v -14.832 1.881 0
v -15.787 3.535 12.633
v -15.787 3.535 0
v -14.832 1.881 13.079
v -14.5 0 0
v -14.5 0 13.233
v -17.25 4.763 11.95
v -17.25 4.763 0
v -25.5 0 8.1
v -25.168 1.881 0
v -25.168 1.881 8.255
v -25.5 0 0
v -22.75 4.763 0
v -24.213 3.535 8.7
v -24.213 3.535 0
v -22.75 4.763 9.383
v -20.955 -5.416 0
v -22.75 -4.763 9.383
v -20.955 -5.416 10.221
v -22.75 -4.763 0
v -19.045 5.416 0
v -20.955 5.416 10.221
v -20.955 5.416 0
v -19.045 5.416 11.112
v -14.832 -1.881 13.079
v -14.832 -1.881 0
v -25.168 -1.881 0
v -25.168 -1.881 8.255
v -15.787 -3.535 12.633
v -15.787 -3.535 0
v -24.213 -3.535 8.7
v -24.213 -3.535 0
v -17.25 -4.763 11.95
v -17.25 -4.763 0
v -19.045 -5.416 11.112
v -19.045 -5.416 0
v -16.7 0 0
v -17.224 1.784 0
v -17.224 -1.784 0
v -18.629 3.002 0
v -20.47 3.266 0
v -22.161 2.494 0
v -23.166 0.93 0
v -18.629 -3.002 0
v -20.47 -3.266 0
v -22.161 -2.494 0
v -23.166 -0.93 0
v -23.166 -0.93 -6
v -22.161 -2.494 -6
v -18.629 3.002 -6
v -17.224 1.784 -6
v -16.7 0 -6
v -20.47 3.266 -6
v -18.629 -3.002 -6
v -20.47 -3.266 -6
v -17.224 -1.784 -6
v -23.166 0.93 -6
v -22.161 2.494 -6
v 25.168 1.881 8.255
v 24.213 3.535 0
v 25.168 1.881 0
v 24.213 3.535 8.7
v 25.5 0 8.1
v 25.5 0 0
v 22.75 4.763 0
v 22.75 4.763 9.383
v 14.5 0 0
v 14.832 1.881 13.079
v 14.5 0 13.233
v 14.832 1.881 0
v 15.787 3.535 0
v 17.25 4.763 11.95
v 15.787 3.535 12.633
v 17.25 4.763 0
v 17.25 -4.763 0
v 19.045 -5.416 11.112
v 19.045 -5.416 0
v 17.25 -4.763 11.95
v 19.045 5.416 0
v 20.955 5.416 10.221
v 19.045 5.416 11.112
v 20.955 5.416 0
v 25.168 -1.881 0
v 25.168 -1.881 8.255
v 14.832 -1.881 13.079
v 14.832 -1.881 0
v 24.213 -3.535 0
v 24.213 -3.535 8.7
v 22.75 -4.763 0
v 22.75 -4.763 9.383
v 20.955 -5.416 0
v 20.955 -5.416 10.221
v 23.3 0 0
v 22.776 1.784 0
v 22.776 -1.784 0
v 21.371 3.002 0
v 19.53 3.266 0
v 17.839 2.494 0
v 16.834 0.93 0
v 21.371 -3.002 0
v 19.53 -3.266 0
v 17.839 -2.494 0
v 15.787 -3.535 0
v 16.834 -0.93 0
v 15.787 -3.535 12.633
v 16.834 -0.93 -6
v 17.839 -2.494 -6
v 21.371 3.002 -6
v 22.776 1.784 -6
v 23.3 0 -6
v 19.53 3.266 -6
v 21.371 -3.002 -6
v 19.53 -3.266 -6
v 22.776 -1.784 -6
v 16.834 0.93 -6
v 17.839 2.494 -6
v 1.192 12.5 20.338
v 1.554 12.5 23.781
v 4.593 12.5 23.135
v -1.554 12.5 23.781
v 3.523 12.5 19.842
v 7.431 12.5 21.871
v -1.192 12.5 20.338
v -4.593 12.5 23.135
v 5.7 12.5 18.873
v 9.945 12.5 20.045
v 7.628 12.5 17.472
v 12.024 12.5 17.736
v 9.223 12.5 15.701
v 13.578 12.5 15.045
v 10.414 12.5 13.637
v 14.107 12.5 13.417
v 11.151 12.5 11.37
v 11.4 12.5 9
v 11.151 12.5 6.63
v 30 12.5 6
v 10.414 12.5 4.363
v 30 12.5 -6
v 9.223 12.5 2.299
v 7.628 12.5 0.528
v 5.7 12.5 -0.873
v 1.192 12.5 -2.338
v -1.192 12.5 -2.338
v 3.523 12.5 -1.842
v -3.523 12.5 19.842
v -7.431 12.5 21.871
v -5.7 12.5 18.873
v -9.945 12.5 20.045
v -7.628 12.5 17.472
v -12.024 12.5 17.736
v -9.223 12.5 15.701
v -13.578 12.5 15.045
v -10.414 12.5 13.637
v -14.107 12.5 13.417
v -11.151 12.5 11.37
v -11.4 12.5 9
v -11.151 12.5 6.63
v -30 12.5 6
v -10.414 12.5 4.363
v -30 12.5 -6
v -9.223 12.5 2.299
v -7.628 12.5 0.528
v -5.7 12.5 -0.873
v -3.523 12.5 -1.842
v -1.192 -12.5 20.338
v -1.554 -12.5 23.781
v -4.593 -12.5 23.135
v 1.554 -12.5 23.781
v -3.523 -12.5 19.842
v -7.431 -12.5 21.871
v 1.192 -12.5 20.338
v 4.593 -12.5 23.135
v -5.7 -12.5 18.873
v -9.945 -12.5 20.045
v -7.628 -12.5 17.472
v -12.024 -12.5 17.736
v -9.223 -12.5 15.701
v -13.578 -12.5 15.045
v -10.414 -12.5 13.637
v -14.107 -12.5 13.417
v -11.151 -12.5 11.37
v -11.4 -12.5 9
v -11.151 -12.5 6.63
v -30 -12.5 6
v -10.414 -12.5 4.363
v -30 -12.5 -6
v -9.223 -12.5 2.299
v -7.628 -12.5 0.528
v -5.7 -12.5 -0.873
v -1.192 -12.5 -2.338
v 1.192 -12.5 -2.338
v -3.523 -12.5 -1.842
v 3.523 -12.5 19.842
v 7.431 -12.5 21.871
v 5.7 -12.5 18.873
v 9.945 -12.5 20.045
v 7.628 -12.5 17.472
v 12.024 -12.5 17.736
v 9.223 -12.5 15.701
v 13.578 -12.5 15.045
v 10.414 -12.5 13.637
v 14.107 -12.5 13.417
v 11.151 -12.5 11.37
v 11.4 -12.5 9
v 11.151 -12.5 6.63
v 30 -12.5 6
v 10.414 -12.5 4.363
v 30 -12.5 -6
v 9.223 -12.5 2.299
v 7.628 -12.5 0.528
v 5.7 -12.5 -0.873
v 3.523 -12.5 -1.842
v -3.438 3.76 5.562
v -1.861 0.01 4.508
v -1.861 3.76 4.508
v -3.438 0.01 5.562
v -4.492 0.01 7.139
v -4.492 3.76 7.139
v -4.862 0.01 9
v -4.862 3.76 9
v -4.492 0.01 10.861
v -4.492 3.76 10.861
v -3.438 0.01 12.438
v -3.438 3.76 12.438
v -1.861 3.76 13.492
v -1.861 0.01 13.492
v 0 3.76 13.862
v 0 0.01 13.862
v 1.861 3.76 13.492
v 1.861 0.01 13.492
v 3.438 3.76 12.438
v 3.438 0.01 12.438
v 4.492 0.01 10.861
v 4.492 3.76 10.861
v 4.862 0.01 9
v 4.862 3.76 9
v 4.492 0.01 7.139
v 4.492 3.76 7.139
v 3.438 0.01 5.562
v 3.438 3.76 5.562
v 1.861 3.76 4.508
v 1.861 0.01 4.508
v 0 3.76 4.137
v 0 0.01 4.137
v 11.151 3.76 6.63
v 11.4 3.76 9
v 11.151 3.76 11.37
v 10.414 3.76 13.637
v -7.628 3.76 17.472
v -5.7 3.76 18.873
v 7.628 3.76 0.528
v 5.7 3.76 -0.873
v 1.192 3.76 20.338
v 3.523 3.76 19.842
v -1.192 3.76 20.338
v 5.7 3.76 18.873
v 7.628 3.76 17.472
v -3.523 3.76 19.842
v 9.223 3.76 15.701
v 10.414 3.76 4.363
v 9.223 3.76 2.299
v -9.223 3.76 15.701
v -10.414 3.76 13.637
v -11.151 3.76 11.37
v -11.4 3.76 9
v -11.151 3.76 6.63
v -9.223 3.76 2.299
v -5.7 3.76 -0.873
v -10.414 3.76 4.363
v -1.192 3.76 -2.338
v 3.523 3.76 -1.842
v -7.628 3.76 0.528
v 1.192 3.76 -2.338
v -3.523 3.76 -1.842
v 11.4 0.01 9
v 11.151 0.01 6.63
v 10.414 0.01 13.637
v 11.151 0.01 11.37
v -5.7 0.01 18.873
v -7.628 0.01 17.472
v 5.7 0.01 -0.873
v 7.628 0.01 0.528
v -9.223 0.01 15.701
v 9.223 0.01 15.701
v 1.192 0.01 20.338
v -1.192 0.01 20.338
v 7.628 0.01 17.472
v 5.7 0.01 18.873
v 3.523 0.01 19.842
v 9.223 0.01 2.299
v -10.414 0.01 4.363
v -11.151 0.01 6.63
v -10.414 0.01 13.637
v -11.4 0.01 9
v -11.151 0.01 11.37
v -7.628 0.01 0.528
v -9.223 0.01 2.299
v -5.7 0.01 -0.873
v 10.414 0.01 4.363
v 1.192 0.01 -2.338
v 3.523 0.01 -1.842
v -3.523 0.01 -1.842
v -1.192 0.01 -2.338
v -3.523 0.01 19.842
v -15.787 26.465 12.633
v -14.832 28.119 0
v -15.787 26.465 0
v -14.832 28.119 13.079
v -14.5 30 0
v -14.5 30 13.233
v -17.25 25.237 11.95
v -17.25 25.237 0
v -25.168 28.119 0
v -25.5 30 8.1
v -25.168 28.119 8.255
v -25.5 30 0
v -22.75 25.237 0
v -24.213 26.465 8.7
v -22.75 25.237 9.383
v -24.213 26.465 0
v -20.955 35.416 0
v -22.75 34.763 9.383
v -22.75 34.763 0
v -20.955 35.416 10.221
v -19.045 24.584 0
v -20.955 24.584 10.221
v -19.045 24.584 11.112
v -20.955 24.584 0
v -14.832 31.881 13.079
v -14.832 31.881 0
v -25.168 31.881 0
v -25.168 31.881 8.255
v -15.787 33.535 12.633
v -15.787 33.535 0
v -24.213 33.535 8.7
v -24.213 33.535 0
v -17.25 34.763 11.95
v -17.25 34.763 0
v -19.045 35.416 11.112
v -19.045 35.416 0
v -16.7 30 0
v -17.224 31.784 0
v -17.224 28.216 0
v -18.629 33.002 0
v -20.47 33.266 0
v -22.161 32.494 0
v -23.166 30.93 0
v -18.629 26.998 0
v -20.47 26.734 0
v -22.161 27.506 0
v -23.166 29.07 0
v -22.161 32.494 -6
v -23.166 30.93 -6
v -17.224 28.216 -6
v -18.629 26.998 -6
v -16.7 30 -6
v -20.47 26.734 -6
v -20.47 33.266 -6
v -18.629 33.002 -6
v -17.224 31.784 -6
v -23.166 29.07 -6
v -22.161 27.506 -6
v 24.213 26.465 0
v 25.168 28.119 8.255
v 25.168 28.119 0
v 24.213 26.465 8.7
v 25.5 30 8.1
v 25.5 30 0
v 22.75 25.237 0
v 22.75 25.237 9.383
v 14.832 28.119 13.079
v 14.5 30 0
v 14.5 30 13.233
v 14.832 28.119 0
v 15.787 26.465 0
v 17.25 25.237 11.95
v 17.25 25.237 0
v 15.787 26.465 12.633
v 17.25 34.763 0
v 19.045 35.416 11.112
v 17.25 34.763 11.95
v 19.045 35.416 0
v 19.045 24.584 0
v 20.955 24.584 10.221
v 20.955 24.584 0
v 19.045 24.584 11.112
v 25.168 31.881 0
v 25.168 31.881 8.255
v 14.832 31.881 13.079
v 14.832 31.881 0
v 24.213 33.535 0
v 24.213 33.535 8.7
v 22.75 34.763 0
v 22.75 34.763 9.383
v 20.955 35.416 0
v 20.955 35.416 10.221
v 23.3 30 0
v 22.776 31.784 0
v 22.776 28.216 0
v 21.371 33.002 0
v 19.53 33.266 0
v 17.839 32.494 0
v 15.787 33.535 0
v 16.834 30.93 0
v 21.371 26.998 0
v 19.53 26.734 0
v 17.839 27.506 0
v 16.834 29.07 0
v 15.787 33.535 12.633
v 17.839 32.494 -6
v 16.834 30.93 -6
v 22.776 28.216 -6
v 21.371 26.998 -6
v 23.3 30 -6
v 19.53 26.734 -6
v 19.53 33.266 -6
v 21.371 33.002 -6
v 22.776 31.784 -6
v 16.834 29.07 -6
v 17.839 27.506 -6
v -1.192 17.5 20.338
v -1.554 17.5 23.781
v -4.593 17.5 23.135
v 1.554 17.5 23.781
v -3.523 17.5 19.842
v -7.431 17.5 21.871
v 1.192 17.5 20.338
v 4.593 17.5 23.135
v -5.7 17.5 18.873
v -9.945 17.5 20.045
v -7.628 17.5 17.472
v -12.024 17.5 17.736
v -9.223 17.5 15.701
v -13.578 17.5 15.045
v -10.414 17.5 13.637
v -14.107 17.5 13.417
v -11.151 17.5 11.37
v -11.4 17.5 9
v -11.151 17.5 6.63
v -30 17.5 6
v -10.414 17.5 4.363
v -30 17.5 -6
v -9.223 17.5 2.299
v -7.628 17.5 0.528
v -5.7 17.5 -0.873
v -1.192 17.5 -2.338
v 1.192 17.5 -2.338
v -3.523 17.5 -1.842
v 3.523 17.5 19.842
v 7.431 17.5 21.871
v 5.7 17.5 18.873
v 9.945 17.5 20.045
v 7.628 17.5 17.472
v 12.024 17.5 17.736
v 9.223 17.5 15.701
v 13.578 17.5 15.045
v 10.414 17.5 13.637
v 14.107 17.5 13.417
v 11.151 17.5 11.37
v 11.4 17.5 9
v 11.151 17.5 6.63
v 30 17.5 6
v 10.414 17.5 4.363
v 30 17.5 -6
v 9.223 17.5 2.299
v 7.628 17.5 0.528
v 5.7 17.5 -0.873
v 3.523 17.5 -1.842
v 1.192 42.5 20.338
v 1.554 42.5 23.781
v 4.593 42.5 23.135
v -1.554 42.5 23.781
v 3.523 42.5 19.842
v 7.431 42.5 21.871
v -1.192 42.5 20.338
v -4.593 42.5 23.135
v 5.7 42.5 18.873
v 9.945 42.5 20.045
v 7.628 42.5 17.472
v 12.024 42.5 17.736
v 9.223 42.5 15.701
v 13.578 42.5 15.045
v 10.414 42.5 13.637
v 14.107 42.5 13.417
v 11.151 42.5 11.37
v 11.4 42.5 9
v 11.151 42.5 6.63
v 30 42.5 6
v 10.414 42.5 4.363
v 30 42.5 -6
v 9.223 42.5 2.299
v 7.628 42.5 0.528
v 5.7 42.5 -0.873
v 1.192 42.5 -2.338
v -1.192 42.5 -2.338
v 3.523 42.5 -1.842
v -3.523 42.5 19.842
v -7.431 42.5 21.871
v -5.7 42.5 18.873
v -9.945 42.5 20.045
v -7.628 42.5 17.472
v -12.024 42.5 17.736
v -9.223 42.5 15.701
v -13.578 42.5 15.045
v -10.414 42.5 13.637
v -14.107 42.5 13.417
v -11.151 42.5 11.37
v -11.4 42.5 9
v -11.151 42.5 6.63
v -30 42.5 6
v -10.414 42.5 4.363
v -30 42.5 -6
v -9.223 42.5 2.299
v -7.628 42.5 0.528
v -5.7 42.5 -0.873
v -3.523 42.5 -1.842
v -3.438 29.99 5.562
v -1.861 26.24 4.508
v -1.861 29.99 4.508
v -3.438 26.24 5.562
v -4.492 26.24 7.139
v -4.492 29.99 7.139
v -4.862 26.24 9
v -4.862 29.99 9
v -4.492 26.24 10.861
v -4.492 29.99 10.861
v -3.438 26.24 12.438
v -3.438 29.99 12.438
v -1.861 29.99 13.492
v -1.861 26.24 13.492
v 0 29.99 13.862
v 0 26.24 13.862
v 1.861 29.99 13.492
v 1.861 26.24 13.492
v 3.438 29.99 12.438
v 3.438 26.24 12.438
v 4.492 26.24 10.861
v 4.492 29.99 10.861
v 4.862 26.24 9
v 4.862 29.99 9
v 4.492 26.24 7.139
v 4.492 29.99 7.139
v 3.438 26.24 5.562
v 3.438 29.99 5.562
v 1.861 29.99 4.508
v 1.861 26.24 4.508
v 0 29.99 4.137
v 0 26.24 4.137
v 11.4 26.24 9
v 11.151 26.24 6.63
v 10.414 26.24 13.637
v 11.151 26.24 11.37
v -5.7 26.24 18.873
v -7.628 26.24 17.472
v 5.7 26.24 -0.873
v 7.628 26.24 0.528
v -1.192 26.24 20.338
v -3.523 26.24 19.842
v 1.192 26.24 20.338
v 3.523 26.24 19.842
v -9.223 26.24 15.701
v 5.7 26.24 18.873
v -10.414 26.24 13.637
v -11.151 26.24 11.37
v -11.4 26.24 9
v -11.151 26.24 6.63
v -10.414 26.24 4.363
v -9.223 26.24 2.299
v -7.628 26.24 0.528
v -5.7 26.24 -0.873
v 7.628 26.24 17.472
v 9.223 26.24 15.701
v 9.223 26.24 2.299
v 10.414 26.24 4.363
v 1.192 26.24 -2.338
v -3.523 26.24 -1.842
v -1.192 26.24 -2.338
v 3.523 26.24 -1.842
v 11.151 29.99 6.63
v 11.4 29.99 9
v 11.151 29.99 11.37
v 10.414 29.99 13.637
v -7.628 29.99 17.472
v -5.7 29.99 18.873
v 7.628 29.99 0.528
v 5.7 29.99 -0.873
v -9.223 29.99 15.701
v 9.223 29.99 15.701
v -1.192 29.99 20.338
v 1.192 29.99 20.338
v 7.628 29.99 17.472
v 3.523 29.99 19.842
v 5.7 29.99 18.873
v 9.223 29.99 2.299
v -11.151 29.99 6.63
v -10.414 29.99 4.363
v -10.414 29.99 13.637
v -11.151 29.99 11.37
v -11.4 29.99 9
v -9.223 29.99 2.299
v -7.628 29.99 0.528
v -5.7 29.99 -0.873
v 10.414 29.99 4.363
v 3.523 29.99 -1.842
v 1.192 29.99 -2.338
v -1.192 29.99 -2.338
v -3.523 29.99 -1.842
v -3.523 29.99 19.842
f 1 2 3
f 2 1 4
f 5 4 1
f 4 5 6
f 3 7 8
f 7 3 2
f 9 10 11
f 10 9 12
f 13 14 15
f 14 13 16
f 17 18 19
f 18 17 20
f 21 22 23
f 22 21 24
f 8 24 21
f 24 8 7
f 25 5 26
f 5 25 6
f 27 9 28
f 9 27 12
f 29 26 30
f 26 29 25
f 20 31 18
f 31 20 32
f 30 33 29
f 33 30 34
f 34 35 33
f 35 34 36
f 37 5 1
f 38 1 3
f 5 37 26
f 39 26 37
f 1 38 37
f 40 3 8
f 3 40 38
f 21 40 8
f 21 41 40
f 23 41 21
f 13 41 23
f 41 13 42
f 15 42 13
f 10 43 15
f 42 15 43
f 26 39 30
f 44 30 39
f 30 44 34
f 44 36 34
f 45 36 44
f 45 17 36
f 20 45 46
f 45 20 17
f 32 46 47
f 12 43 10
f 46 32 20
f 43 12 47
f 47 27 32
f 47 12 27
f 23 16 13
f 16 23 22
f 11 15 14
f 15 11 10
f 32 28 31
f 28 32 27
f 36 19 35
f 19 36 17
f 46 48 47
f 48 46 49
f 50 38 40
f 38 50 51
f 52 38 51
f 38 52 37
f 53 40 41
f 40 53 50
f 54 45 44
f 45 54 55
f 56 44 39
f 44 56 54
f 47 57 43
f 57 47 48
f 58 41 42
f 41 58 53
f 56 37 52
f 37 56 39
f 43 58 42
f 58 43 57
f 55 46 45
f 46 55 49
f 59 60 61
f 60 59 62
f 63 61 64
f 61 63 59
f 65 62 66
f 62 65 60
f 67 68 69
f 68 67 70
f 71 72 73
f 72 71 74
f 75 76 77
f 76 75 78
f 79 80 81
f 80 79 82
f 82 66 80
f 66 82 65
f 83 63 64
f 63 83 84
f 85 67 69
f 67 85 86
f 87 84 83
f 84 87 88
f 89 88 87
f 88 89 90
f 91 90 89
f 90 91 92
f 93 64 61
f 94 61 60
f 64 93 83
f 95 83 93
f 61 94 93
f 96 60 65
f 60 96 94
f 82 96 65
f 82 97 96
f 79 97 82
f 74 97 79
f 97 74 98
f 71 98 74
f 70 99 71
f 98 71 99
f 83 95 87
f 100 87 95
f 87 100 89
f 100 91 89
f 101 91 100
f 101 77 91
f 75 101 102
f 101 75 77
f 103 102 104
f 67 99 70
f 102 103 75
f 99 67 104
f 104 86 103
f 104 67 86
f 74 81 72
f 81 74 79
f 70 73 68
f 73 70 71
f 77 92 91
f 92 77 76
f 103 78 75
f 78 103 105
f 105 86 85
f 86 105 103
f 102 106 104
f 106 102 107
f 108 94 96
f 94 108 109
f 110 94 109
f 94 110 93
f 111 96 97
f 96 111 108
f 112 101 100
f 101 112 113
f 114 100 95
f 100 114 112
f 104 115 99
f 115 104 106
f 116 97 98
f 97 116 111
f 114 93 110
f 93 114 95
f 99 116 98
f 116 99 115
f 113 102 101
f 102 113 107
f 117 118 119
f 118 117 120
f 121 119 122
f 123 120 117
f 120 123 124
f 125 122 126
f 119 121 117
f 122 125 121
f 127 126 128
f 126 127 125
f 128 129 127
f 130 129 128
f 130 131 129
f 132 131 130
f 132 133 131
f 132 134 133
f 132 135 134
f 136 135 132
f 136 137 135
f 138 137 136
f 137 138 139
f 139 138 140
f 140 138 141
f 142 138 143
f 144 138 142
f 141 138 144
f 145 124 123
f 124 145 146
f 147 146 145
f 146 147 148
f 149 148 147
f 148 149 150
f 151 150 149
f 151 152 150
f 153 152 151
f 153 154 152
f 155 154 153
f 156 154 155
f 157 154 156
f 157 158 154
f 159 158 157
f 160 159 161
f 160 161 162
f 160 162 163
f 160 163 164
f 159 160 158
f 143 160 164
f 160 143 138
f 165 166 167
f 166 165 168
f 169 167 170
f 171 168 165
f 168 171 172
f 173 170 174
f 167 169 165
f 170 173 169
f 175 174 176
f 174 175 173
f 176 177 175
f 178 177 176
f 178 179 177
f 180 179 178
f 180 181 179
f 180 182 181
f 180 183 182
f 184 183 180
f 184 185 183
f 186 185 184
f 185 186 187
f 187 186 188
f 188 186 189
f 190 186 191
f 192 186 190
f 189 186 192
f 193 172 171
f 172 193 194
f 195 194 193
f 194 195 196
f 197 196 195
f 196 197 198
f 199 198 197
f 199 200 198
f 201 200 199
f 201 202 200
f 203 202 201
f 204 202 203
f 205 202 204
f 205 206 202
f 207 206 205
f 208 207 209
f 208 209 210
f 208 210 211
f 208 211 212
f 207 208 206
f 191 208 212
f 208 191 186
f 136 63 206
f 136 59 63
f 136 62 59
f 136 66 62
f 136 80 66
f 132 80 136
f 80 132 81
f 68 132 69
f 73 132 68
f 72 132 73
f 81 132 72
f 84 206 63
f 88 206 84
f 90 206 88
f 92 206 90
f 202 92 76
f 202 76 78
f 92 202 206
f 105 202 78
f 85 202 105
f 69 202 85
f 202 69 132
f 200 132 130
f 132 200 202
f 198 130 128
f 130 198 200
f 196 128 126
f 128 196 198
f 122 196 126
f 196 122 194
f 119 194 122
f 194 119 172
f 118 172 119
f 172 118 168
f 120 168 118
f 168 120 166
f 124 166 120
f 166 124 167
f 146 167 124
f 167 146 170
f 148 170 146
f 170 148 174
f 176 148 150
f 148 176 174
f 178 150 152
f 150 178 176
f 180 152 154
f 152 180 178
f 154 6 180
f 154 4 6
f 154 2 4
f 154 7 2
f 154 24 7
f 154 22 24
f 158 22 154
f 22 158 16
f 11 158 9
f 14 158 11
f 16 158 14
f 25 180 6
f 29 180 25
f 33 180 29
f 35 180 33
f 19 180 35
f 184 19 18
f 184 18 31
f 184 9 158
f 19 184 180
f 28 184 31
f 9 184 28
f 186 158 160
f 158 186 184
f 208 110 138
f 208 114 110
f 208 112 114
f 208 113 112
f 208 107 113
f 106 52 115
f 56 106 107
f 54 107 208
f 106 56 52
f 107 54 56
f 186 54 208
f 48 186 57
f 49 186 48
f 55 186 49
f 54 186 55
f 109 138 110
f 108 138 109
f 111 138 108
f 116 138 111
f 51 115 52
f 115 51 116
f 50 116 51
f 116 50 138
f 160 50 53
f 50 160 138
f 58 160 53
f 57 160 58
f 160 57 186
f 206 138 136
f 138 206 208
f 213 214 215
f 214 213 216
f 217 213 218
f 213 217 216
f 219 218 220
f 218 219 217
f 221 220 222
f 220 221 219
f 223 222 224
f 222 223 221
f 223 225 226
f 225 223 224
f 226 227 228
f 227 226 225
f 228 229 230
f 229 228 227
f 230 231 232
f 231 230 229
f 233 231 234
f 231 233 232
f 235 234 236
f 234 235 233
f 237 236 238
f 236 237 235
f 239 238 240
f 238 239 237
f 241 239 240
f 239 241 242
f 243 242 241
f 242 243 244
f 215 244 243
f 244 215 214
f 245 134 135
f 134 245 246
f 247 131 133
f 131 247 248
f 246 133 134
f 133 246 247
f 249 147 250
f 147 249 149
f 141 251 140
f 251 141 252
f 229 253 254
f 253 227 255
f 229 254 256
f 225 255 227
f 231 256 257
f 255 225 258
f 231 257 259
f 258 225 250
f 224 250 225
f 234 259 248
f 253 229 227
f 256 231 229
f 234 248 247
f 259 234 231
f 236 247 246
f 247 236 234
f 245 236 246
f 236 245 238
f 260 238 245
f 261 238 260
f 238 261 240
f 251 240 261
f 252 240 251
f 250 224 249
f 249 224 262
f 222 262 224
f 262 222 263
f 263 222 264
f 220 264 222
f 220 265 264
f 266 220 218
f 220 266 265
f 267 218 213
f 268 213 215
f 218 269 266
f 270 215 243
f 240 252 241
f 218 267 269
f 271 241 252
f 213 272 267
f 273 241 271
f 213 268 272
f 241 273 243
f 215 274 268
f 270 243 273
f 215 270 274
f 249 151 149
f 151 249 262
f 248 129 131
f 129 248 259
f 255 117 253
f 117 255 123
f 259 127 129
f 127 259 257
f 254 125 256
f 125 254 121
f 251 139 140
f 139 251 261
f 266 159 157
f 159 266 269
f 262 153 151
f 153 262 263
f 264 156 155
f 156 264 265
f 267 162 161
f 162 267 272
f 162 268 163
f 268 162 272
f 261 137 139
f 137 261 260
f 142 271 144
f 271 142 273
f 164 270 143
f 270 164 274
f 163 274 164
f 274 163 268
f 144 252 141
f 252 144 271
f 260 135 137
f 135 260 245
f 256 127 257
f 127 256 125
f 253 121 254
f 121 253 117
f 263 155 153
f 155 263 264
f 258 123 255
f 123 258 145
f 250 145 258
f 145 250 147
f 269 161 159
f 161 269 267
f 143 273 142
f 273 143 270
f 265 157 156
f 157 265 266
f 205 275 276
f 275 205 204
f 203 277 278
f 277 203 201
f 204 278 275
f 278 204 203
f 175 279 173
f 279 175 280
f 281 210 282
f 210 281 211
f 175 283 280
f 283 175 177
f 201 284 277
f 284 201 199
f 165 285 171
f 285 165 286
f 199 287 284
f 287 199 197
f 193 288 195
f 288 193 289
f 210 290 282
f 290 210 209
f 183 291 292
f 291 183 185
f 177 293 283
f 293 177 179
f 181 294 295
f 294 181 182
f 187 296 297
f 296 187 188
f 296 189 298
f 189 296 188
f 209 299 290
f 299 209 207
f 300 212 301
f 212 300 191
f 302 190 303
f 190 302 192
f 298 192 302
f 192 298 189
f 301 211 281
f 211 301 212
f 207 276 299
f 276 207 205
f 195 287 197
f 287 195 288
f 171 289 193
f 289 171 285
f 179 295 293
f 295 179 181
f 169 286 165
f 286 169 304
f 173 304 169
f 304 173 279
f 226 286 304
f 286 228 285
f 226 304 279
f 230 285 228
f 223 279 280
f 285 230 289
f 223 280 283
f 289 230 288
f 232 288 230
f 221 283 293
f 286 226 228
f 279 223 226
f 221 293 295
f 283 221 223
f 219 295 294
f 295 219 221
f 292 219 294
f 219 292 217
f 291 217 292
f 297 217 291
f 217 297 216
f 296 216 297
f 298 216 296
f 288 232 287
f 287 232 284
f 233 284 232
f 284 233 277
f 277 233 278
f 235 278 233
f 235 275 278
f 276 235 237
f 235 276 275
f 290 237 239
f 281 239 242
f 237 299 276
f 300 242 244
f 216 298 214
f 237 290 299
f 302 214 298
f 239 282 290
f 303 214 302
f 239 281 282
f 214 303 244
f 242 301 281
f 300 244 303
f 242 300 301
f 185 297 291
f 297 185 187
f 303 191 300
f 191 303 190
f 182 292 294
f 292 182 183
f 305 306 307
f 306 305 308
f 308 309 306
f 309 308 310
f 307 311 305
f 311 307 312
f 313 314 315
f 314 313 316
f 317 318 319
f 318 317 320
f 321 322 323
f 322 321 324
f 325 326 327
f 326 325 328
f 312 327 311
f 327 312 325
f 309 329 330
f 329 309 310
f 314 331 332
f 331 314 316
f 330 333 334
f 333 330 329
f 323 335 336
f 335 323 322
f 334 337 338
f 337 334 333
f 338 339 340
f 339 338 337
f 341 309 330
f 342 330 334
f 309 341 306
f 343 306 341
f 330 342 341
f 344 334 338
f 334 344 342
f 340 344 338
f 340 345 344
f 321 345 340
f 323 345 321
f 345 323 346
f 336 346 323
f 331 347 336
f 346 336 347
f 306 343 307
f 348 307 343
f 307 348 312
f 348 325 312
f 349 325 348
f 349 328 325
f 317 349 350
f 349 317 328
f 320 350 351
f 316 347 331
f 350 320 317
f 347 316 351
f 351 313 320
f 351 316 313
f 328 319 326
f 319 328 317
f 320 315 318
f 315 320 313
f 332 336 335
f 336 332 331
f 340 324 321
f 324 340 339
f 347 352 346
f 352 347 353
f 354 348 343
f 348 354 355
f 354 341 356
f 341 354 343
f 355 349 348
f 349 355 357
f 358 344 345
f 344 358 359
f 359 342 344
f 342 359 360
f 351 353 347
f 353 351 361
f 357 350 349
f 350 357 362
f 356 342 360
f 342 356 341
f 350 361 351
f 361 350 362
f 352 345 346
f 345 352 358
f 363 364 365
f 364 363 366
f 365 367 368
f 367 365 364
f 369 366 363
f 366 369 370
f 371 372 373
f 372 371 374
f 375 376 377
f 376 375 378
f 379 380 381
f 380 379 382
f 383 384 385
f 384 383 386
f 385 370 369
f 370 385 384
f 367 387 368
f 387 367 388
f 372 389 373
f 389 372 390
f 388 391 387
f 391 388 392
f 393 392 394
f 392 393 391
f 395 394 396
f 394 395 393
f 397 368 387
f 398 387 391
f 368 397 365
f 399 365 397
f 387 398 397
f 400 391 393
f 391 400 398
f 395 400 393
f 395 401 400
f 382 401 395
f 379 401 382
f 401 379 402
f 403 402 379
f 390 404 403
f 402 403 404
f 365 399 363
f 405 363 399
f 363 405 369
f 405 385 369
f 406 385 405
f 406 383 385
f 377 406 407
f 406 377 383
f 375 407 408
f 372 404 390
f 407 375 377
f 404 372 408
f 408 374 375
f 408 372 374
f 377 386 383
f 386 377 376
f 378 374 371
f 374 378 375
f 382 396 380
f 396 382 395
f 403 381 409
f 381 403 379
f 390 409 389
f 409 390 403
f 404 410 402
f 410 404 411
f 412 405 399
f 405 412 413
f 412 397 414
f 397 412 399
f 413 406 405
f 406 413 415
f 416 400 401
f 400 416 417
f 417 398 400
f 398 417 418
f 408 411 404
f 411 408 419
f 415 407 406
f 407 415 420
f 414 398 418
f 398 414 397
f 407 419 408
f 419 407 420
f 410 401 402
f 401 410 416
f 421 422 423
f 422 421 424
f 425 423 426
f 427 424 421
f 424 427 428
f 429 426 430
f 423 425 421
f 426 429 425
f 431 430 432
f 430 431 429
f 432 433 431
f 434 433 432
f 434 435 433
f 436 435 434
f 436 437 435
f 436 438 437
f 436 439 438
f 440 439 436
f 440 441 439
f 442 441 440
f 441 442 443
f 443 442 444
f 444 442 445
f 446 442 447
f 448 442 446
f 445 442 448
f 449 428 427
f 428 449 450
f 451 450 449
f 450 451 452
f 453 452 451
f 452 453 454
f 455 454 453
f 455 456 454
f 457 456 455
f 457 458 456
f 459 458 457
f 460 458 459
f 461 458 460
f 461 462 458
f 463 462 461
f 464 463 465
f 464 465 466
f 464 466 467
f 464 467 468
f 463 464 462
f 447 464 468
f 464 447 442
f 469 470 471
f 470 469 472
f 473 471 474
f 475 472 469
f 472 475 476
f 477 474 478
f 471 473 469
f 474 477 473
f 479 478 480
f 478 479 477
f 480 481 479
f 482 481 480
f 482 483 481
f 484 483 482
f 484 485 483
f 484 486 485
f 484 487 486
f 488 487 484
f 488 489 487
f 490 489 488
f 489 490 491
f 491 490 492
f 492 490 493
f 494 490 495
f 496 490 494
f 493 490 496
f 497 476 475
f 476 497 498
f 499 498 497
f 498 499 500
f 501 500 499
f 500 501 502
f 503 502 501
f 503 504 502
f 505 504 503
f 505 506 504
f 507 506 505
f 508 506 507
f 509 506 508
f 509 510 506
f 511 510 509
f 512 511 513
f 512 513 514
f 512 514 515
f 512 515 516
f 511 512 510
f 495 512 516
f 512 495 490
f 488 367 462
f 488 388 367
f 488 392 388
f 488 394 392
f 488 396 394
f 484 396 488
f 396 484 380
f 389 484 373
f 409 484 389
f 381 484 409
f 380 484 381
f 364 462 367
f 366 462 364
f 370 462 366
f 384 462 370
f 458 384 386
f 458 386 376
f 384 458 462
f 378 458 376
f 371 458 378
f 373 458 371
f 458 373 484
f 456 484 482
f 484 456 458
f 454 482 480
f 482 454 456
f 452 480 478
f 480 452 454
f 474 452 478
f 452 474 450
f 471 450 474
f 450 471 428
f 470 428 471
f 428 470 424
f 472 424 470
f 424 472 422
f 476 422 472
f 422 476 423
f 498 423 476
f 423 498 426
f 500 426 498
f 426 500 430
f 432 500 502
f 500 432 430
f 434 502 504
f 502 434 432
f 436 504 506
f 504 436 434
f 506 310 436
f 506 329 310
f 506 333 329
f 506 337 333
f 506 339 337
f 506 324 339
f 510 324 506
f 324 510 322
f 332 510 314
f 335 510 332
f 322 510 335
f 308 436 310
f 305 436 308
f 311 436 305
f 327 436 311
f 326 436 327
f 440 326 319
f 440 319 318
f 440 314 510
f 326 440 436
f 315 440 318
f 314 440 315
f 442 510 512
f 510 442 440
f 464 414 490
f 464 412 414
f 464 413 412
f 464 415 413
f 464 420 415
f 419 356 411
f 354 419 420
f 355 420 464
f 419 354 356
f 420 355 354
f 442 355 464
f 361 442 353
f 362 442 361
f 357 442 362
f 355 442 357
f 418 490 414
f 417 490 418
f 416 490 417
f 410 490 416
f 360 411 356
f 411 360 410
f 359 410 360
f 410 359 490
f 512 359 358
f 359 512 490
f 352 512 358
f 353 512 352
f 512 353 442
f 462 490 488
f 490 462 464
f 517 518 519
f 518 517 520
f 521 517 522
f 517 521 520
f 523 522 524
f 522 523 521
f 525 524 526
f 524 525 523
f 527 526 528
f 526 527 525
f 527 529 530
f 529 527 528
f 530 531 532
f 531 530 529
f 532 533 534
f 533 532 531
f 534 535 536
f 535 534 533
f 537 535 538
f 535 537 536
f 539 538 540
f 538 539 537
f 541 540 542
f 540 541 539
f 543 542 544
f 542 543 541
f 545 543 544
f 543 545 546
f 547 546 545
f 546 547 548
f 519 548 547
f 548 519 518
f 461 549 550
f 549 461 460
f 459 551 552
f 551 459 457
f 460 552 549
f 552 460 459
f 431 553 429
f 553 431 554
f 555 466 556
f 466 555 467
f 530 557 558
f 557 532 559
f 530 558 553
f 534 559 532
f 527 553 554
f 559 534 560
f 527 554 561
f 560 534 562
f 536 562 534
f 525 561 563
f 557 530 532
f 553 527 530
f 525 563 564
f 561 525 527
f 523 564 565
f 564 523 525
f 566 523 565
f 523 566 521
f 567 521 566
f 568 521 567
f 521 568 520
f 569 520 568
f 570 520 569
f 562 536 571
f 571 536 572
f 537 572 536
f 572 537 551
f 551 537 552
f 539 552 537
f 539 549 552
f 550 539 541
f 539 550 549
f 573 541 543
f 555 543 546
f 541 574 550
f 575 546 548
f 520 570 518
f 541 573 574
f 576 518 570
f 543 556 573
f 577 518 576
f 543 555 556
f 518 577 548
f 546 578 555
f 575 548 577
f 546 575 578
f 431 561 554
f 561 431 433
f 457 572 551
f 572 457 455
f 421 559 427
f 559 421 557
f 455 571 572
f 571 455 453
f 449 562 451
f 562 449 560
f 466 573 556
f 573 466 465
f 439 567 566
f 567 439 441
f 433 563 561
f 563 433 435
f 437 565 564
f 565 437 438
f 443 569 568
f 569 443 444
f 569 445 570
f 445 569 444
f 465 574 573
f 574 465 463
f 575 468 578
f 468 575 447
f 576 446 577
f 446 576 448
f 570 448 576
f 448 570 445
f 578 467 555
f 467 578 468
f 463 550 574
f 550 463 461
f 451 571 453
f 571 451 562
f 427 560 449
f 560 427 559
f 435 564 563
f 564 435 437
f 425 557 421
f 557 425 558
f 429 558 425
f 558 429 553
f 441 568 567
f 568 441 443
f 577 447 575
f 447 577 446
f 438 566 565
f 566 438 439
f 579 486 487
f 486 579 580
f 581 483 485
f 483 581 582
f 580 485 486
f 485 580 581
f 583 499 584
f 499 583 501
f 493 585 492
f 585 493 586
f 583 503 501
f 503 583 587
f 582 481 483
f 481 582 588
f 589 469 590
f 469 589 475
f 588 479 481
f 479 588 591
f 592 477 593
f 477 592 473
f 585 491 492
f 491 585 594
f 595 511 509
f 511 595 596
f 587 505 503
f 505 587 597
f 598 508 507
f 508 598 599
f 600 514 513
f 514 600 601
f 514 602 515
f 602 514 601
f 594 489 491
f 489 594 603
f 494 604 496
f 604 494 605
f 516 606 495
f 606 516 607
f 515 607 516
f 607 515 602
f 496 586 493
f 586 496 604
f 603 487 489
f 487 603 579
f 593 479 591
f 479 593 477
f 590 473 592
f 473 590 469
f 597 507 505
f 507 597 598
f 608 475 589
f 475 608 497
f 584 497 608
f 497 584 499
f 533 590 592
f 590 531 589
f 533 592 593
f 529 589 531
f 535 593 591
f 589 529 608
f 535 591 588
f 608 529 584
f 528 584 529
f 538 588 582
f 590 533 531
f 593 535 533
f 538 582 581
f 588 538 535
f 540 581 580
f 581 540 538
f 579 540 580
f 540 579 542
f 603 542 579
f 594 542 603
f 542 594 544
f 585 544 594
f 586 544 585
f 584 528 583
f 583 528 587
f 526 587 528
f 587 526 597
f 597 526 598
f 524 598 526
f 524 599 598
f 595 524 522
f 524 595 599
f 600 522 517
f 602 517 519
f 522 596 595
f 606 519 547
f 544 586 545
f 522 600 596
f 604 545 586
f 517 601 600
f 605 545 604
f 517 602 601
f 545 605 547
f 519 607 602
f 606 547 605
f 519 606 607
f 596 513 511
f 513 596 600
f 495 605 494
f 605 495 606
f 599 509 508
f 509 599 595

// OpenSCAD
inch = 25.4;

h_offset = 9;
width = 25;
well_depth = 0.65 * width;
well_depth2 = -0.50 * width;
length = 60;

axle_diam = 3/8 * inch + 0.2;

module mount() {
difference() {
     rotate([90,0,0])
     linear_extrude(width, center=true)
     difference() {
          union() {
               thickness = 12;
               translate([0, h_offset]) circle(r=(axle_diam + 20)/2);
               polygon([[-length/2, -thickness/2],
                        [-length/2, +thickness/2],
                        [0, 20],
                        [+length/2, +thickness/2],
                        [+length/2, -thickness/2],
                        [-length/2, -thickness/2]]);
          }
          translate([0, h_offset]) circle(r=axle_diam/2);
     }

     translate([0, well_depth+0.01, h_offset]) rotate([90,0,0]) cylinder(r=22.8 / 2, h=width, center=true);
     translate([0, well_depth2+0.01, h_offset]) rotate([90,0,0]) cylinder(r=22.8 / 2, h=width, center=true);

     // bolt holes
     for (i=[-1,1]) translate([i*20, 0, 0]) {
           cylinder(r=11/2, h=30);
           cylinder(r=6.6/2, h=70, center=true);
     }
}
}

mount();
translate([0, 30, 0]) mirror([0,-1,0]) mount();
